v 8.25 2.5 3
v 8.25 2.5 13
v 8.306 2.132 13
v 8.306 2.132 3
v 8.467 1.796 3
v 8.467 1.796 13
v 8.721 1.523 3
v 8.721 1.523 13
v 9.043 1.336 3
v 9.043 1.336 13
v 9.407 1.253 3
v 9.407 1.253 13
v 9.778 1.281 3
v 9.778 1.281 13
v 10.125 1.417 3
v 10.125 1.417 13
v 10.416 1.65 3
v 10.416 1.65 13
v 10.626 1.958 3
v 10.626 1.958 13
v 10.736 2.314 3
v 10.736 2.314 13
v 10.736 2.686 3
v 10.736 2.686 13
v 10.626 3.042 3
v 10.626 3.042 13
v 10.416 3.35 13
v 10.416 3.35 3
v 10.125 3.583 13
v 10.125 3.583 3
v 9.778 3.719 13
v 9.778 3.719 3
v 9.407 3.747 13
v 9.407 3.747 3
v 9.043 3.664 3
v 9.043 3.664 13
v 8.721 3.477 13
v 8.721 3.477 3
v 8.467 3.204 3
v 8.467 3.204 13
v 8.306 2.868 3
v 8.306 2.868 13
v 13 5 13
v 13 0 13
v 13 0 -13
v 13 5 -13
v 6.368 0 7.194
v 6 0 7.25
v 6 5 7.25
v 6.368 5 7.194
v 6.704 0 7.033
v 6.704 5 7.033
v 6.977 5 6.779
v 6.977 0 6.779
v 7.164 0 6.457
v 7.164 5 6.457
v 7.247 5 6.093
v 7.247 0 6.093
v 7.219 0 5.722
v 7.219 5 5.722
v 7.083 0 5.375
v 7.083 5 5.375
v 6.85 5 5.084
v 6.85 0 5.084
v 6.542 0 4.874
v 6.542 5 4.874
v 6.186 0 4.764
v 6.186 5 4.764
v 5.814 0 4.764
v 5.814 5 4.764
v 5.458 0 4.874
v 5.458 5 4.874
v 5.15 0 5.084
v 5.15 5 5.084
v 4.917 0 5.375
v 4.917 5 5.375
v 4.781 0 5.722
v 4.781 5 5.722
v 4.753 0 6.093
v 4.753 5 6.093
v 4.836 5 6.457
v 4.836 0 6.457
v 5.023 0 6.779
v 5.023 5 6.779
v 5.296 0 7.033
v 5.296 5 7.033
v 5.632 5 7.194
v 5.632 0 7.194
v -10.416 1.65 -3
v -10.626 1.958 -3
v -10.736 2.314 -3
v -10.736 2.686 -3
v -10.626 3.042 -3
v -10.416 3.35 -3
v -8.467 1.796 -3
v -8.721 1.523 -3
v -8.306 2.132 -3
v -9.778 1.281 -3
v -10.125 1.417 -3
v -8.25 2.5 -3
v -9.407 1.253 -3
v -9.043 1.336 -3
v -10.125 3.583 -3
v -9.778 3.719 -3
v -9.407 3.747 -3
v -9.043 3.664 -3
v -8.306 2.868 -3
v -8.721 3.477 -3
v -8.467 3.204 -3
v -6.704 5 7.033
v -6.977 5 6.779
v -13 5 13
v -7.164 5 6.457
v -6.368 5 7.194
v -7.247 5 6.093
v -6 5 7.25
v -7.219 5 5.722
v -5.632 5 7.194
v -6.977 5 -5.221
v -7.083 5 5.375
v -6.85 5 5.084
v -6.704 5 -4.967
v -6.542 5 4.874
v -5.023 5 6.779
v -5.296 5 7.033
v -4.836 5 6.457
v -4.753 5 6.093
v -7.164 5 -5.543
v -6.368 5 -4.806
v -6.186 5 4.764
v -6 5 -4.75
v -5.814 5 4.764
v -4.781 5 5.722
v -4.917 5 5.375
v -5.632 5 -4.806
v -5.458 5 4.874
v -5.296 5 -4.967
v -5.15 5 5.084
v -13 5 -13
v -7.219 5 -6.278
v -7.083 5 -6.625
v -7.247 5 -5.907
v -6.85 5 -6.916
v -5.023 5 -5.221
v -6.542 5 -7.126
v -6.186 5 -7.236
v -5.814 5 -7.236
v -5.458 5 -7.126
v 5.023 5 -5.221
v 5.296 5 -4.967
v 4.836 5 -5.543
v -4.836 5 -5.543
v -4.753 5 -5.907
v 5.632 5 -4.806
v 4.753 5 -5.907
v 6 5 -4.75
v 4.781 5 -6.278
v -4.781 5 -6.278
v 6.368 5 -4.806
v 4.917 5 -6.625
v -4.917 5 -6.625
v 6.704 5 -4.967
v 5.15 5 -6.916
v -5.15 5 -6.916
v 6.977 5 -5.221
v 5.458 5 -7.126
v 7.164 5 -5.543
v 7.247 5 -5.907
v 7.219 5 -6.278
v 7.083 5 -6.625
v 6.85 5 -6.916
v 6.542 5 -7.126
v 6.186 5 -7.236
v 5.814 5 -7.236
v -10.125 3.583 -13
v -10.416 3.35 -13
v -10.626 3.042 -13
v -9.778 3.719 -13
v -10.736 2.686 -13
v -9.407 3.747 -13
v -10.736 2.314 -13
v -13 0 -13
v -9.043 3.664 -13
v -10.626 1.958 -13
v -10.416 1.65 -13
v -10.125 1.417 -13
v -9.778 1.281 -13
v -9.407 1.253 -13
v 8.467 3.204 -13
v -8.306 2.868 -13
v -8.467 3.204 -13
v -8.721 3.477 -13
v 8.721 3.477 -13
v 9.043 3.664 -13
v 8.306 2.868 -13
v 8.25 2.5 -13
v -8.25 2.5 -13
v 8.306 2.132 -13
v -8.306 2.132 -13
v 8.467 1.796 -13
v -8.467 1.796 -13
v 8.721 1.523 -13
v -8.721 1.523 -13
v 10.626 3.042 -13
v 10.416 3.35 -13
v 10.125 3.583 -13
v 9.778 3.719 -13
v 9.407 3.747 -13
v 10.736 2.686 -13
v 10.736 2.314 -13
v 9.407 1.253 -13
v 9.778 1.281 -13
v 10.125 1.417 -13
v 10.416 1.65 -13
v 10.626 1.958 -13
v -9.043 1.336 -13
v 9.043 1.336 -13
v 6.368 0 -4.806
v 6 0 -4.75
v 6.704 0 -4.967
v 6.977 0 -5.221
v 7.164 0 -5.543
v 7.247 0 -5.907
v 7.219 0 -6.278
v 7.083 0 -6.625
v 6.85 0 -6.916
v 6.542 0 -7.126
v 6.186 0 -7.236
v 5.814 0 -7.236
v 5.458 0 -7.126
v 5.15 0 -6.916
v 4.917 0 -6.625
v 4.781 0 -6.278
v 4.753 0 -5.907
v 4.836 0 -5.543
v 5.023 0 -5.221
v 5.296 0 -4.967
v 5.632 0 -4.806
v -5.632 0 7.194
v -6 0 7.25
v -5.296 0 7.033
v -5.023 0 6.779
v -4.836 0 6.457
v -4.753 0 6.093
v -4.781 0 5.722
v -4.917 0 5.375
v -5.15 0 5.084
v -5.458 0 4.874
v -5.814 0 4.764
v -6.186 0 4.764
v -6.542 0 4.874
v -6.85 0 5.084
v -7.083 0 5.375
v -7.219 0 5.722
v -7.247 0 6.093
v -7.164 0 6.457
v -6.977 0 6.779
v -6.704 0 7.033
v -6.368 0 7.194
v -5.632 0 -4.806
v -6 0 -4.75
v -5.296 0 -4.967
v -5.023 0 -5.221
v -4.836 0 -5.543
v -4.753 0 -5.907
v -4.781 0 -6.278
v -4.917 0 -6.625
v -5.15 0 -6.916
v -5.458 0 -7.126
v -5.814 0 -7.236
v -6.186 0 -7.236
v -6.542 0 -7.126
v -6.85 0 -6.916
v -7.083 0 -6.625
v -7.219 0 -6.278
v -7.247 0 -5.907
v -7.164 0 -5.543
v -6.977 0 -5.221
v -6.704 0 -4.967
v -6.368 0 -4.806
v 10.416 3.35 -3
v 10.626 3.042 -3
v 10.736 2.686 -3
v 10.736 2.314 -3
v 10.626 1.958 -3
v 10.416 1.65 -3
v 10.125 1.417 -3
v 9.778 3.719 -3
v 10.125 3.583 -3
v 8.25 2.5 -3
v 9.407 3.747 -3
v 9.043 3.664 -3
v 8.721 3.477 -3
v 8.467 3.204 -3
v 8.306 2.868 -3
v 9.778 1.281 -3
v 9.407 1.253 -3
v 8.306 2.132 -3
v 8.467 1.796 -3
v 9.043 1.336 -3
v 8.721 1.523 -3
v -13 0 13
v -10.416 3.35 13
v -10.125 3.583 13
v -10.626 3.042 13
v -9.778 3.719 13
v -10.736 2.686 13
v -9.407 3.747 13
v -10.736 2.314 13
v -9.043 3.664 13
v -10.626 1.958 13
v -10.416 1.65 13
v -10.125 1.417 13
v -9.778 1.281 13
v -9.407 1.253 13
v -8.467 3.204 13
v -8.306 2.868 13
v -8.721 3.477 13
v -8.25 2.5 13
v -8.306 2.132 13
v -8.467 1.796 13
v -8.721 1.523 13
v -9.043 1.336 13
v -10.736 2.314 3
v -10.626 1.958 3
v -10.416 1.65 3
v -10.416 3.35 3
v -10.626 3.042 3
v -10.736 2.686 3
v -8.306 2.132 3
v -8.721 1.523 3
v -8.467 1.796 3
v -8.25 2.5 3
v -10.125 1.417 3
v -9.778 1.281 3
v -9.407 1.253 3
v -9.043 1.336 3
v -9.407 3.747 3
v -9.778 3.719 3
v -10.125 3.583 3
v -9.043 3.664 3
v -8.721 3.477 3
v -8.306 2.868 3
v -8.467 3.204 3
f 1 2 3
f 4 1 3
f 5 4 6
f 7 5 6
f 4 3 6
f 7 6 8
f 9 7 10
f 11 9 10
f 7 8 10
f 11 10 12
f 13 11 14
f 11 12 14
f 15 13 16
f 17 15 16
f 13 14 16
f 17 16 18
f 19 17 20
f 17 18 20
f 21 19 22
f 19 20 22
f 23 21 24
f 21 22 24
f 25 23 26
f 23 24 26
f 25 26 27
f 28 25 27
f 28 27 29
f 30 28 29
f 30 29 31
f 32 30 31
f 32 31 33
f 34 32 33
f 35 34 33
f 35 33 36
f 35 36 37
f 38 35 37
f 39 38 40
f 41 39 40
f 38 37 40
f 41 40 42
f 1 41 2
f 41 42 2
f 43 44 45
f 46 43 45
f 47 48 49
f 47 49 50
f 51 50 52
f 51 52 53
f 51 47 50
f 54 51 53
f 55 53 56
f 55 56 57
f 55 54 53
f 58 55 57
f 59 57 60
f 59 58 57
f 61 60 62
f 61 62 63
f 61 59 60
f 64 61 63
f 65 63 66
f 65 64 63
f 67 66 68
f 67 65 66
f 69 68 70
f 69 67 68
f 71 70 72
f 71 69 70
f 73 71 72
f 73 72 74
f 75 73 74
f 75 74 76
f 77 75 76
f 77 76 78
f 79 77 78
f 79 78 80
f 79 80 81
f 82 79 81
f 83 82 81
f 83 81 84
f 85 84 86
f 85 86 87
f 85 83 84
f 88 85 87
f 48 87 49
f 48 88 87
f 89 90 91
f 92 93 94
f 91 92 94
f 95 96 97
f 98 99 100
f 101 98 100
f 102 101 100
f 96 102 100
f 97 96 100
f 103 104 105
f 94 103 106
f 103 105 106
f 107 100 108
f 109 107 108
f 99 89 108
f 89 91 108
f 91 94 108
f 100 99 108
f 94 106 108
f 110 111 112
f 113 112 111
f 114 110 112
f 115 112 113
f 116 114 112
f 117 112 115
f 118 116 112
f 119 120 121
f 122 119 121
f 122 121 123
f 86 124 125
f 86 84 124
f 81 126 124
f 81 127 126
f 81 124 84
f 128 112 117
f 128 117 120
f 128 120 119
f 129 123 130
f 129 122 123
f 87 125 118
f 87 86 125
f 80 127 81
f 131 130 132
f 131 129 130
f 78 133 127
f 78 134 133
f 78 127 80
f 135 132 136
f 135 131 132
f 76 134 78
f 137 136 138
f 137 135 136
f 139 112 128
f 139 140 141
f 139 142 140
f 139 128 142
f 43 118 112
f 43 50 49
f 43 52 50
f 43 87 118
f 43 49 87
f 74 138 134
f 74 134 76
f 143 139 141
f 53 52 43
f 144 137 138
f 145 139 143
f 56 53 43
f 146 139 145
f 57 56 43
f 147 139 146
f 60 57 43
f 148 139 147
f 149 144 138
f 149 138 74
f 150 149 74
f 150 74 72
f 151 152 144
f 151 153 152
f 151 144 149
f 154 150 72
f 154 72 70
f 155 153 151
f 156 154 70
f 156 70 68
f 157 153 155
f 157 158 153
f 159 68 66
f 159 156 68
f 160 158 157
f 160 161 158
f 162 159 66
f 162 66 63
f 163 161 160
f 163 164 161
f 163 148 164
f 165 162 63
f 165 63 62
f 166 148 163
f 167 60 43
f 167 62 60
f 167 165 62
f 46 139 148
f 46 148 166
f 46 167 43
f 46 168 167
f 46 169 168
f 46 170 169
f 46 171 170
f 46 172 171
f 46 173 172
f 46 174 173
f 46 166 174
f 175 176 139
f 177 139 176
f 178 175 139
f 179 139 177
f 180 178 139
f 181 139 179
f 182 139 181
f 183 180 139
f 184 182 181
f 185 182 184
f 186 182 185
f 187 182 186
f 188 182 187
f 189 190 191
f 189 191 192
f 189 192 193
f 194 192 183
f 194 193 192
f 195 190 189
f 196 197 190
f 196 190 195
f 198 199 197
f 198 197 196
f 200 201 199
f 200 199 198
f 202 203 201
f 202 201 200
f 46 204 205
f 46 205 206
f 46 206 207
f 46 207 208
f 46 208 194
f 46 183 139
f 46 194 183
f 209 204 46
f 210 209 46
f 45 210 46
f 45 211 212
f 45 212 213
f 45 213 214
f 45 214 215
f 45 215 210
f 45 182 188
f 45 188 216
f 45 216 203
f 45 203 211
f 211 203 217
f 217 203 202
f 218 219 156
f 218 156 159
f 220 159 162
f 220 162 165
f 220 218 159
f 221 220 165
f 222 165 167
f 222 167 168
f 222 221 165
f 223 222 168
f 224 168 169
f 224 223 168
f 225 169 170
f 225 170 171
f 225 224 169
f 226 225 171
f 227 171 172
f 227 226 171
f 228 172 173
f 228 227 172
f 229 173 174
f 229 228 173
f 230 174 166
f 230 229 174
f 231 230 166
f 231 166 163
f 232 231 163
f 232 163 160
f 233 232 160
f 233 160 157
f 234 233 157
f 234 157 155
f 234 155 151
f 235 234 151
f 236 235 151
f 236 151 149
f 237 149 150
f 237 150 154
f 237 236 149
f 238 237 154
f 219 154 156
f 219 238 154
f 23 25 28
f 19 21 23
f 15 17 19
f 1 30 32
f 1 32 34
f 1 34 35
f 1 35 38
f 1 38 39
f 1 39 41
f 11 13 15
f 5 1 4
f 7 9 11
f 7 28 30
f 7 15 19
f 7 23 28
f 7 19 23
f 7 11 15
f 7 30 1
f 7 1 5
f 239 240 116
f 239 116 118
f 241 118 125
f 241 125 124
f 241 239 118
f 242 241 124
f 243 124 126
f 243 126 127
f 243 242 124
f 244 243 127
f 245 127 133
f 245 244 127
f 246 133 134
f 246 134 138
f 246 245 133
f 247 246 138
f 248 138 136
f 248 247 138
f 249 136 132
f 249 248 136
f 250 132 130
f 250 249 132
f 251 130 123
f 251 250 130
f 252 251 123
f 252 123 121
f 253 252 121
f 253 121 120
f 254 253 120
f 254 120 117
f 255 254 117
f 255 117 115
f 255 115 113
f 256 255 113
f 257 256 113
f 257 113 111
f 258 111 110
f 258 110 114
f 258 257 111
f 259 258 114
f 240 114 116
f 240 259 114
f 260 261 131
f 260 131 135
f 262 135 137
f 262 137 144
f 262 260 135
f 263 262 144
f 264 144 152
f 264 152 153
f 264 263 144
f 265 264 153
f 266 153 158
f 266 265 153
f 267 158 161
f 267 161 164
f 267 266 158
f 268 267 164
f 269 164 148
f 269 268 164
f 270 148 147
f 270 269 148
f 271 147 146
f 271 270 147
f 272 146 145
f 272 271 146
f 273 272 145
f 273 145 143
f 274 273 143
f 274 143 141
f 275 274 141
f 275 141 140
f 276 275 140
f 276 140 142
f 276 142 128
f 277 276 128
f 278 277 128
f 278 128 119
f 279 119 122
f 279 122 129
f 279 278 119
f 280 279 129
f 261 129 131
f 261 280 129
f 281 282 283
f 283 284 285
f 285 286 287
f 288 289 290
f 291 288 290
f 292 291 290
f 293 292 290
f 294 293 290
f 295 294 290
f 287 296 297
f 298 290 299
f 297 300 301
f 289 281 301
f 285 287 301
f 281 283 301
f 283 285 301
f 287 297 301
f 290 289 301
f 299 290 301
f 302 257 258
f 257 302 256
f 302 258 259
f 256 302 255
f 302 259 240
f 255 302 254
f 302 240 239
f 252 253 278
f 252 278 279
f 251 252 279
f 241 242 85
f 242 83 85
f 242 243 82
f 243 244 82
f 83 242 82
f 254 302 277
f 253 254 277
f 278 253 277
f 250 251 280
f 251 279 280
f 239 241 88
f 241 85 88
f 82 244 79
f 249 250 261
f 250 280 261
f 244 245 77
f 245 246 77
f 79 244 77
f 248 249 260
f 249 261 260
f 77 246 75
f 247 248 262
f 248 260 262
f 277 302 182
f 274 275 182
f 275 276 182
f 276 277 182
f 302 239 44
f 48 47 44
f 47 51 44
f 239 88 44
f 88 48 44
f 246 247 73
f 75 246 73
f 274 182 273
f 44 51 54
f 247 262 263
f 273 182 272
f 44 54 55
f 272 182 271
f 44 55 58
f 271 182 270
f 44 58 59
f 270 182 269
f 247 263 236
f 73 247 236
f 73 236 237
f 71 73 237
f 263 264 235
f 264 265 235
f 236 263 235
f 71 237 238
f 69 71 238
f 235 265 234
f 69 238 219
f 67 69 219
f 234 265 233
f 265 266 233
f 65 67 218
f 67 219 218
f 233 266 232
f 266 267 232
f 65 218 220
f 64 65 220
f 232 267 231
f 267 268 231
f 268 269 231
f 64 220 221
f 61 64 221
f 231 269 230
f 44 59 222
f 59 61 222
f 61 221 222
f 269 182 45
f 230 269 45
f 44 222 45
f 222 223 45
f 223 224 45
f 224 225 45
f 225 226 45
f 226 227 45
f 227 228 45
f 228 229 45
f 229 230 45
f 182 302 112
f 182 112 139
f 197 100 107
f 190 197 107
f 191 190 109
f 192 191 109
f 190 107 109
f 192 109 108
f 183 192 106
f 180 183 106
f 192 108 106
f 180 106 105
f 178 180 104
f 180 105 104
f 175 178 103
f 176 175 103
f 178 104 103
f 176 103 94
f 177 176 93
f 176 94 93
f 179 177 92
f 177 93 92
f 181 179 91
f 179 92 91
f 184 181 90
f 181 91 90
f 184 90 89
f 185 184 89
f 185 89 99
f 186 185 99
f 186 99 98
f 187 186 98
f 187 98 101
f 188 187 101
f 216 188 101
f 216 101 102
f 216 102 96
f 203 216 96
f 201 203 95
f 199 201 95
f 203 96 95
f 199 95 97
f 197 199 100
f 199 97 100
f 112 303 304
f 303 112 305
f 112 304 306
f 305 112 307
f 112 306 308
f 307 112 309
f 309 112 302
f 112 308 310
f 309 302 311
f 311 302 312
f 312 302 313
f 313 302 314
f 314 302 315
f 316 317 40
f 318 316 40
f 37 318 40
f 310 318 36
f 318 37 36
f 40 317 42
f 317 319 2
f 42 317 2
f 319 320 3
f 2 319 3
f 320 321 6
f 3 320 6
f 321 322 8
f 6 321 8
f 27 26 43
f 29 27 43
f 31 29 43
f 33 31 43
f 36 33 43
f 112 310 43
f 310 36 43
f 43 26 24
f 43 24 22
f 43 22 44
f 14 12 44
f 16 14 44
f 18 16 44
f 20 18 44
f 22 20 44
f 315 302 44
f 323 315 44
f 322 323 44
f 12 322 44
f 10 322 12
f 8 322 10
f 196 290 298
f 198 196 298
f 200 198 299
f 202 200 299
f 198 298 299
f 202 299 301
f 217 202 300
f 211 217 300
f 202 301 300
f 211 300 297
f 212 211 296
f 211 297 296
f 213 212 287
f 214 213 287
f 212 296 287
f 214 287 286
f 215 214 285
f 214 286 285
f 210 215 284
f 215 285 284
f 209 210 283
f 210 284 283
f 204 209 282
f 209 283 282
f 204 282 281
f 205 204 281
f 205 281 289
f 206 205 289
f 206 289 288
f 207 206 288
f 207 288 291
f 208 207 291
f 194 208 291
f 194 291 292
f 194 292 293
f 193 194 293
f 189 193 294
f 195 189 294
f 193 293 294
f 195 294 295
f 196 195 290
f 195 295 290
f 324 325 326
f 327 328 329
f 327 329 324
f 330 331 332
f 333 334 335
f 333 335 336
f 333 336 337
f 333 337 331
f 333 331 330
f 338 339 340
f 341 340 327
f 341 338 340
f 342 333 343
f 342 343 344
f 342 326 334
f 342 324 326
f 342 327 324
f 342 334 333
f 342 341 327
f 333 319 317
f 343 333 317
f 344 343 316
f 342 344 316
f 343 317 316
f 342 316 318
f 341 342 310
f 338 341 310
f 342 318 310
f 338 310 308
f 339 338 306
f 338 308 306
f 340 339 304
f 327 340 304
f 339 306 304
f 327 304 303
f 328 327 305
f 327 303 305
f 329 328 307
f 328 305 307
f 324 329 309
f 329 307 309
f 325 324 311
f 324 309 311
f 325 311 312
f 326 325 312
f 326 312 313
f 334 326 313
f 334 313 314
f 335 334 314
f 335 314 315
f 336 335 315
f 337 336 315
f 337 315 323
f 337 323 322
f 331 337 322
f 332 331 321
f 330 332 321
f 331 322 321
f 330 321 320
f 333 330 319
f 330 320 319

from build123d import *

# Parameters (mm, degrees)
SKETCH1_W           = 26
SKETCH1_H           = 26
SKETCH1_R           = 1.25
BOSS_EXTRUDE1_DEPTH = 5
SKETCH2_R           = 1.25
CUT_EXTRUDE1_DEPTH  = 10
LPATTERN1_COUNT     = 2
LPATTERN1_PITCH     = 16


with BuildPart() as part:
    # Sketch1 → Boss-Extrude1 (new body)
    with BuildSketch(Plane(origin=(0, 0, 0), x_dir=(1, 0, 0), z_dir=(0, 1, 0))):
        Rectangle(SKETCH1_W, SKETCH1_H)
        with Locations(Location((-6, -6, 0), (0, 0, 270))):
            Circle(SKETCH1_R, mode=Mode.SUBTRACT)
        with Locations(Location((6, -6, 0), (0, 0, 270))):
            Circle(SKETCH1_R, mode=Mode.SUBTRACT)
        with Locations(Location((6, 6, 0), (0, 0, 270))):
            Circle(SKETCH1_R, mode=Mode.SUBTRACT)
        with Locations(Location((-6, 6, 0), (0, 0, 270))):
            Circle(SKETCH1_R, mode=Mode.SUBTRACT)
    extrude(amount=BOSS_EXTRUDE1_DEPTH)

    # Sketch2 → Cut-Extrude1 (cut)
    with BuildSketch(Plane.XY.offset(13)):
        with Locations((-9.5, 2.5)):
            Circle(SKETCH2_R)
        with Locations(Location((9.5, 2.5, 0), (0, 0, 180))):
            Circle(SKETCH2_R)
    cut_extrude1 = extrude(amount=-CUT_EXTRUDE1_DEPTH, mode=Mode.SUBTRACT)

    # LPattern1: Cut-Extrude1 ×2
    with Locations(*[(0, 0, -i * LPATTERN1_PITCH) for i in range(1, LPATTERN1_COUNT)]):
        add(cut_extrude1, mode=Mode.SUBTRACT)


solid = part.part
